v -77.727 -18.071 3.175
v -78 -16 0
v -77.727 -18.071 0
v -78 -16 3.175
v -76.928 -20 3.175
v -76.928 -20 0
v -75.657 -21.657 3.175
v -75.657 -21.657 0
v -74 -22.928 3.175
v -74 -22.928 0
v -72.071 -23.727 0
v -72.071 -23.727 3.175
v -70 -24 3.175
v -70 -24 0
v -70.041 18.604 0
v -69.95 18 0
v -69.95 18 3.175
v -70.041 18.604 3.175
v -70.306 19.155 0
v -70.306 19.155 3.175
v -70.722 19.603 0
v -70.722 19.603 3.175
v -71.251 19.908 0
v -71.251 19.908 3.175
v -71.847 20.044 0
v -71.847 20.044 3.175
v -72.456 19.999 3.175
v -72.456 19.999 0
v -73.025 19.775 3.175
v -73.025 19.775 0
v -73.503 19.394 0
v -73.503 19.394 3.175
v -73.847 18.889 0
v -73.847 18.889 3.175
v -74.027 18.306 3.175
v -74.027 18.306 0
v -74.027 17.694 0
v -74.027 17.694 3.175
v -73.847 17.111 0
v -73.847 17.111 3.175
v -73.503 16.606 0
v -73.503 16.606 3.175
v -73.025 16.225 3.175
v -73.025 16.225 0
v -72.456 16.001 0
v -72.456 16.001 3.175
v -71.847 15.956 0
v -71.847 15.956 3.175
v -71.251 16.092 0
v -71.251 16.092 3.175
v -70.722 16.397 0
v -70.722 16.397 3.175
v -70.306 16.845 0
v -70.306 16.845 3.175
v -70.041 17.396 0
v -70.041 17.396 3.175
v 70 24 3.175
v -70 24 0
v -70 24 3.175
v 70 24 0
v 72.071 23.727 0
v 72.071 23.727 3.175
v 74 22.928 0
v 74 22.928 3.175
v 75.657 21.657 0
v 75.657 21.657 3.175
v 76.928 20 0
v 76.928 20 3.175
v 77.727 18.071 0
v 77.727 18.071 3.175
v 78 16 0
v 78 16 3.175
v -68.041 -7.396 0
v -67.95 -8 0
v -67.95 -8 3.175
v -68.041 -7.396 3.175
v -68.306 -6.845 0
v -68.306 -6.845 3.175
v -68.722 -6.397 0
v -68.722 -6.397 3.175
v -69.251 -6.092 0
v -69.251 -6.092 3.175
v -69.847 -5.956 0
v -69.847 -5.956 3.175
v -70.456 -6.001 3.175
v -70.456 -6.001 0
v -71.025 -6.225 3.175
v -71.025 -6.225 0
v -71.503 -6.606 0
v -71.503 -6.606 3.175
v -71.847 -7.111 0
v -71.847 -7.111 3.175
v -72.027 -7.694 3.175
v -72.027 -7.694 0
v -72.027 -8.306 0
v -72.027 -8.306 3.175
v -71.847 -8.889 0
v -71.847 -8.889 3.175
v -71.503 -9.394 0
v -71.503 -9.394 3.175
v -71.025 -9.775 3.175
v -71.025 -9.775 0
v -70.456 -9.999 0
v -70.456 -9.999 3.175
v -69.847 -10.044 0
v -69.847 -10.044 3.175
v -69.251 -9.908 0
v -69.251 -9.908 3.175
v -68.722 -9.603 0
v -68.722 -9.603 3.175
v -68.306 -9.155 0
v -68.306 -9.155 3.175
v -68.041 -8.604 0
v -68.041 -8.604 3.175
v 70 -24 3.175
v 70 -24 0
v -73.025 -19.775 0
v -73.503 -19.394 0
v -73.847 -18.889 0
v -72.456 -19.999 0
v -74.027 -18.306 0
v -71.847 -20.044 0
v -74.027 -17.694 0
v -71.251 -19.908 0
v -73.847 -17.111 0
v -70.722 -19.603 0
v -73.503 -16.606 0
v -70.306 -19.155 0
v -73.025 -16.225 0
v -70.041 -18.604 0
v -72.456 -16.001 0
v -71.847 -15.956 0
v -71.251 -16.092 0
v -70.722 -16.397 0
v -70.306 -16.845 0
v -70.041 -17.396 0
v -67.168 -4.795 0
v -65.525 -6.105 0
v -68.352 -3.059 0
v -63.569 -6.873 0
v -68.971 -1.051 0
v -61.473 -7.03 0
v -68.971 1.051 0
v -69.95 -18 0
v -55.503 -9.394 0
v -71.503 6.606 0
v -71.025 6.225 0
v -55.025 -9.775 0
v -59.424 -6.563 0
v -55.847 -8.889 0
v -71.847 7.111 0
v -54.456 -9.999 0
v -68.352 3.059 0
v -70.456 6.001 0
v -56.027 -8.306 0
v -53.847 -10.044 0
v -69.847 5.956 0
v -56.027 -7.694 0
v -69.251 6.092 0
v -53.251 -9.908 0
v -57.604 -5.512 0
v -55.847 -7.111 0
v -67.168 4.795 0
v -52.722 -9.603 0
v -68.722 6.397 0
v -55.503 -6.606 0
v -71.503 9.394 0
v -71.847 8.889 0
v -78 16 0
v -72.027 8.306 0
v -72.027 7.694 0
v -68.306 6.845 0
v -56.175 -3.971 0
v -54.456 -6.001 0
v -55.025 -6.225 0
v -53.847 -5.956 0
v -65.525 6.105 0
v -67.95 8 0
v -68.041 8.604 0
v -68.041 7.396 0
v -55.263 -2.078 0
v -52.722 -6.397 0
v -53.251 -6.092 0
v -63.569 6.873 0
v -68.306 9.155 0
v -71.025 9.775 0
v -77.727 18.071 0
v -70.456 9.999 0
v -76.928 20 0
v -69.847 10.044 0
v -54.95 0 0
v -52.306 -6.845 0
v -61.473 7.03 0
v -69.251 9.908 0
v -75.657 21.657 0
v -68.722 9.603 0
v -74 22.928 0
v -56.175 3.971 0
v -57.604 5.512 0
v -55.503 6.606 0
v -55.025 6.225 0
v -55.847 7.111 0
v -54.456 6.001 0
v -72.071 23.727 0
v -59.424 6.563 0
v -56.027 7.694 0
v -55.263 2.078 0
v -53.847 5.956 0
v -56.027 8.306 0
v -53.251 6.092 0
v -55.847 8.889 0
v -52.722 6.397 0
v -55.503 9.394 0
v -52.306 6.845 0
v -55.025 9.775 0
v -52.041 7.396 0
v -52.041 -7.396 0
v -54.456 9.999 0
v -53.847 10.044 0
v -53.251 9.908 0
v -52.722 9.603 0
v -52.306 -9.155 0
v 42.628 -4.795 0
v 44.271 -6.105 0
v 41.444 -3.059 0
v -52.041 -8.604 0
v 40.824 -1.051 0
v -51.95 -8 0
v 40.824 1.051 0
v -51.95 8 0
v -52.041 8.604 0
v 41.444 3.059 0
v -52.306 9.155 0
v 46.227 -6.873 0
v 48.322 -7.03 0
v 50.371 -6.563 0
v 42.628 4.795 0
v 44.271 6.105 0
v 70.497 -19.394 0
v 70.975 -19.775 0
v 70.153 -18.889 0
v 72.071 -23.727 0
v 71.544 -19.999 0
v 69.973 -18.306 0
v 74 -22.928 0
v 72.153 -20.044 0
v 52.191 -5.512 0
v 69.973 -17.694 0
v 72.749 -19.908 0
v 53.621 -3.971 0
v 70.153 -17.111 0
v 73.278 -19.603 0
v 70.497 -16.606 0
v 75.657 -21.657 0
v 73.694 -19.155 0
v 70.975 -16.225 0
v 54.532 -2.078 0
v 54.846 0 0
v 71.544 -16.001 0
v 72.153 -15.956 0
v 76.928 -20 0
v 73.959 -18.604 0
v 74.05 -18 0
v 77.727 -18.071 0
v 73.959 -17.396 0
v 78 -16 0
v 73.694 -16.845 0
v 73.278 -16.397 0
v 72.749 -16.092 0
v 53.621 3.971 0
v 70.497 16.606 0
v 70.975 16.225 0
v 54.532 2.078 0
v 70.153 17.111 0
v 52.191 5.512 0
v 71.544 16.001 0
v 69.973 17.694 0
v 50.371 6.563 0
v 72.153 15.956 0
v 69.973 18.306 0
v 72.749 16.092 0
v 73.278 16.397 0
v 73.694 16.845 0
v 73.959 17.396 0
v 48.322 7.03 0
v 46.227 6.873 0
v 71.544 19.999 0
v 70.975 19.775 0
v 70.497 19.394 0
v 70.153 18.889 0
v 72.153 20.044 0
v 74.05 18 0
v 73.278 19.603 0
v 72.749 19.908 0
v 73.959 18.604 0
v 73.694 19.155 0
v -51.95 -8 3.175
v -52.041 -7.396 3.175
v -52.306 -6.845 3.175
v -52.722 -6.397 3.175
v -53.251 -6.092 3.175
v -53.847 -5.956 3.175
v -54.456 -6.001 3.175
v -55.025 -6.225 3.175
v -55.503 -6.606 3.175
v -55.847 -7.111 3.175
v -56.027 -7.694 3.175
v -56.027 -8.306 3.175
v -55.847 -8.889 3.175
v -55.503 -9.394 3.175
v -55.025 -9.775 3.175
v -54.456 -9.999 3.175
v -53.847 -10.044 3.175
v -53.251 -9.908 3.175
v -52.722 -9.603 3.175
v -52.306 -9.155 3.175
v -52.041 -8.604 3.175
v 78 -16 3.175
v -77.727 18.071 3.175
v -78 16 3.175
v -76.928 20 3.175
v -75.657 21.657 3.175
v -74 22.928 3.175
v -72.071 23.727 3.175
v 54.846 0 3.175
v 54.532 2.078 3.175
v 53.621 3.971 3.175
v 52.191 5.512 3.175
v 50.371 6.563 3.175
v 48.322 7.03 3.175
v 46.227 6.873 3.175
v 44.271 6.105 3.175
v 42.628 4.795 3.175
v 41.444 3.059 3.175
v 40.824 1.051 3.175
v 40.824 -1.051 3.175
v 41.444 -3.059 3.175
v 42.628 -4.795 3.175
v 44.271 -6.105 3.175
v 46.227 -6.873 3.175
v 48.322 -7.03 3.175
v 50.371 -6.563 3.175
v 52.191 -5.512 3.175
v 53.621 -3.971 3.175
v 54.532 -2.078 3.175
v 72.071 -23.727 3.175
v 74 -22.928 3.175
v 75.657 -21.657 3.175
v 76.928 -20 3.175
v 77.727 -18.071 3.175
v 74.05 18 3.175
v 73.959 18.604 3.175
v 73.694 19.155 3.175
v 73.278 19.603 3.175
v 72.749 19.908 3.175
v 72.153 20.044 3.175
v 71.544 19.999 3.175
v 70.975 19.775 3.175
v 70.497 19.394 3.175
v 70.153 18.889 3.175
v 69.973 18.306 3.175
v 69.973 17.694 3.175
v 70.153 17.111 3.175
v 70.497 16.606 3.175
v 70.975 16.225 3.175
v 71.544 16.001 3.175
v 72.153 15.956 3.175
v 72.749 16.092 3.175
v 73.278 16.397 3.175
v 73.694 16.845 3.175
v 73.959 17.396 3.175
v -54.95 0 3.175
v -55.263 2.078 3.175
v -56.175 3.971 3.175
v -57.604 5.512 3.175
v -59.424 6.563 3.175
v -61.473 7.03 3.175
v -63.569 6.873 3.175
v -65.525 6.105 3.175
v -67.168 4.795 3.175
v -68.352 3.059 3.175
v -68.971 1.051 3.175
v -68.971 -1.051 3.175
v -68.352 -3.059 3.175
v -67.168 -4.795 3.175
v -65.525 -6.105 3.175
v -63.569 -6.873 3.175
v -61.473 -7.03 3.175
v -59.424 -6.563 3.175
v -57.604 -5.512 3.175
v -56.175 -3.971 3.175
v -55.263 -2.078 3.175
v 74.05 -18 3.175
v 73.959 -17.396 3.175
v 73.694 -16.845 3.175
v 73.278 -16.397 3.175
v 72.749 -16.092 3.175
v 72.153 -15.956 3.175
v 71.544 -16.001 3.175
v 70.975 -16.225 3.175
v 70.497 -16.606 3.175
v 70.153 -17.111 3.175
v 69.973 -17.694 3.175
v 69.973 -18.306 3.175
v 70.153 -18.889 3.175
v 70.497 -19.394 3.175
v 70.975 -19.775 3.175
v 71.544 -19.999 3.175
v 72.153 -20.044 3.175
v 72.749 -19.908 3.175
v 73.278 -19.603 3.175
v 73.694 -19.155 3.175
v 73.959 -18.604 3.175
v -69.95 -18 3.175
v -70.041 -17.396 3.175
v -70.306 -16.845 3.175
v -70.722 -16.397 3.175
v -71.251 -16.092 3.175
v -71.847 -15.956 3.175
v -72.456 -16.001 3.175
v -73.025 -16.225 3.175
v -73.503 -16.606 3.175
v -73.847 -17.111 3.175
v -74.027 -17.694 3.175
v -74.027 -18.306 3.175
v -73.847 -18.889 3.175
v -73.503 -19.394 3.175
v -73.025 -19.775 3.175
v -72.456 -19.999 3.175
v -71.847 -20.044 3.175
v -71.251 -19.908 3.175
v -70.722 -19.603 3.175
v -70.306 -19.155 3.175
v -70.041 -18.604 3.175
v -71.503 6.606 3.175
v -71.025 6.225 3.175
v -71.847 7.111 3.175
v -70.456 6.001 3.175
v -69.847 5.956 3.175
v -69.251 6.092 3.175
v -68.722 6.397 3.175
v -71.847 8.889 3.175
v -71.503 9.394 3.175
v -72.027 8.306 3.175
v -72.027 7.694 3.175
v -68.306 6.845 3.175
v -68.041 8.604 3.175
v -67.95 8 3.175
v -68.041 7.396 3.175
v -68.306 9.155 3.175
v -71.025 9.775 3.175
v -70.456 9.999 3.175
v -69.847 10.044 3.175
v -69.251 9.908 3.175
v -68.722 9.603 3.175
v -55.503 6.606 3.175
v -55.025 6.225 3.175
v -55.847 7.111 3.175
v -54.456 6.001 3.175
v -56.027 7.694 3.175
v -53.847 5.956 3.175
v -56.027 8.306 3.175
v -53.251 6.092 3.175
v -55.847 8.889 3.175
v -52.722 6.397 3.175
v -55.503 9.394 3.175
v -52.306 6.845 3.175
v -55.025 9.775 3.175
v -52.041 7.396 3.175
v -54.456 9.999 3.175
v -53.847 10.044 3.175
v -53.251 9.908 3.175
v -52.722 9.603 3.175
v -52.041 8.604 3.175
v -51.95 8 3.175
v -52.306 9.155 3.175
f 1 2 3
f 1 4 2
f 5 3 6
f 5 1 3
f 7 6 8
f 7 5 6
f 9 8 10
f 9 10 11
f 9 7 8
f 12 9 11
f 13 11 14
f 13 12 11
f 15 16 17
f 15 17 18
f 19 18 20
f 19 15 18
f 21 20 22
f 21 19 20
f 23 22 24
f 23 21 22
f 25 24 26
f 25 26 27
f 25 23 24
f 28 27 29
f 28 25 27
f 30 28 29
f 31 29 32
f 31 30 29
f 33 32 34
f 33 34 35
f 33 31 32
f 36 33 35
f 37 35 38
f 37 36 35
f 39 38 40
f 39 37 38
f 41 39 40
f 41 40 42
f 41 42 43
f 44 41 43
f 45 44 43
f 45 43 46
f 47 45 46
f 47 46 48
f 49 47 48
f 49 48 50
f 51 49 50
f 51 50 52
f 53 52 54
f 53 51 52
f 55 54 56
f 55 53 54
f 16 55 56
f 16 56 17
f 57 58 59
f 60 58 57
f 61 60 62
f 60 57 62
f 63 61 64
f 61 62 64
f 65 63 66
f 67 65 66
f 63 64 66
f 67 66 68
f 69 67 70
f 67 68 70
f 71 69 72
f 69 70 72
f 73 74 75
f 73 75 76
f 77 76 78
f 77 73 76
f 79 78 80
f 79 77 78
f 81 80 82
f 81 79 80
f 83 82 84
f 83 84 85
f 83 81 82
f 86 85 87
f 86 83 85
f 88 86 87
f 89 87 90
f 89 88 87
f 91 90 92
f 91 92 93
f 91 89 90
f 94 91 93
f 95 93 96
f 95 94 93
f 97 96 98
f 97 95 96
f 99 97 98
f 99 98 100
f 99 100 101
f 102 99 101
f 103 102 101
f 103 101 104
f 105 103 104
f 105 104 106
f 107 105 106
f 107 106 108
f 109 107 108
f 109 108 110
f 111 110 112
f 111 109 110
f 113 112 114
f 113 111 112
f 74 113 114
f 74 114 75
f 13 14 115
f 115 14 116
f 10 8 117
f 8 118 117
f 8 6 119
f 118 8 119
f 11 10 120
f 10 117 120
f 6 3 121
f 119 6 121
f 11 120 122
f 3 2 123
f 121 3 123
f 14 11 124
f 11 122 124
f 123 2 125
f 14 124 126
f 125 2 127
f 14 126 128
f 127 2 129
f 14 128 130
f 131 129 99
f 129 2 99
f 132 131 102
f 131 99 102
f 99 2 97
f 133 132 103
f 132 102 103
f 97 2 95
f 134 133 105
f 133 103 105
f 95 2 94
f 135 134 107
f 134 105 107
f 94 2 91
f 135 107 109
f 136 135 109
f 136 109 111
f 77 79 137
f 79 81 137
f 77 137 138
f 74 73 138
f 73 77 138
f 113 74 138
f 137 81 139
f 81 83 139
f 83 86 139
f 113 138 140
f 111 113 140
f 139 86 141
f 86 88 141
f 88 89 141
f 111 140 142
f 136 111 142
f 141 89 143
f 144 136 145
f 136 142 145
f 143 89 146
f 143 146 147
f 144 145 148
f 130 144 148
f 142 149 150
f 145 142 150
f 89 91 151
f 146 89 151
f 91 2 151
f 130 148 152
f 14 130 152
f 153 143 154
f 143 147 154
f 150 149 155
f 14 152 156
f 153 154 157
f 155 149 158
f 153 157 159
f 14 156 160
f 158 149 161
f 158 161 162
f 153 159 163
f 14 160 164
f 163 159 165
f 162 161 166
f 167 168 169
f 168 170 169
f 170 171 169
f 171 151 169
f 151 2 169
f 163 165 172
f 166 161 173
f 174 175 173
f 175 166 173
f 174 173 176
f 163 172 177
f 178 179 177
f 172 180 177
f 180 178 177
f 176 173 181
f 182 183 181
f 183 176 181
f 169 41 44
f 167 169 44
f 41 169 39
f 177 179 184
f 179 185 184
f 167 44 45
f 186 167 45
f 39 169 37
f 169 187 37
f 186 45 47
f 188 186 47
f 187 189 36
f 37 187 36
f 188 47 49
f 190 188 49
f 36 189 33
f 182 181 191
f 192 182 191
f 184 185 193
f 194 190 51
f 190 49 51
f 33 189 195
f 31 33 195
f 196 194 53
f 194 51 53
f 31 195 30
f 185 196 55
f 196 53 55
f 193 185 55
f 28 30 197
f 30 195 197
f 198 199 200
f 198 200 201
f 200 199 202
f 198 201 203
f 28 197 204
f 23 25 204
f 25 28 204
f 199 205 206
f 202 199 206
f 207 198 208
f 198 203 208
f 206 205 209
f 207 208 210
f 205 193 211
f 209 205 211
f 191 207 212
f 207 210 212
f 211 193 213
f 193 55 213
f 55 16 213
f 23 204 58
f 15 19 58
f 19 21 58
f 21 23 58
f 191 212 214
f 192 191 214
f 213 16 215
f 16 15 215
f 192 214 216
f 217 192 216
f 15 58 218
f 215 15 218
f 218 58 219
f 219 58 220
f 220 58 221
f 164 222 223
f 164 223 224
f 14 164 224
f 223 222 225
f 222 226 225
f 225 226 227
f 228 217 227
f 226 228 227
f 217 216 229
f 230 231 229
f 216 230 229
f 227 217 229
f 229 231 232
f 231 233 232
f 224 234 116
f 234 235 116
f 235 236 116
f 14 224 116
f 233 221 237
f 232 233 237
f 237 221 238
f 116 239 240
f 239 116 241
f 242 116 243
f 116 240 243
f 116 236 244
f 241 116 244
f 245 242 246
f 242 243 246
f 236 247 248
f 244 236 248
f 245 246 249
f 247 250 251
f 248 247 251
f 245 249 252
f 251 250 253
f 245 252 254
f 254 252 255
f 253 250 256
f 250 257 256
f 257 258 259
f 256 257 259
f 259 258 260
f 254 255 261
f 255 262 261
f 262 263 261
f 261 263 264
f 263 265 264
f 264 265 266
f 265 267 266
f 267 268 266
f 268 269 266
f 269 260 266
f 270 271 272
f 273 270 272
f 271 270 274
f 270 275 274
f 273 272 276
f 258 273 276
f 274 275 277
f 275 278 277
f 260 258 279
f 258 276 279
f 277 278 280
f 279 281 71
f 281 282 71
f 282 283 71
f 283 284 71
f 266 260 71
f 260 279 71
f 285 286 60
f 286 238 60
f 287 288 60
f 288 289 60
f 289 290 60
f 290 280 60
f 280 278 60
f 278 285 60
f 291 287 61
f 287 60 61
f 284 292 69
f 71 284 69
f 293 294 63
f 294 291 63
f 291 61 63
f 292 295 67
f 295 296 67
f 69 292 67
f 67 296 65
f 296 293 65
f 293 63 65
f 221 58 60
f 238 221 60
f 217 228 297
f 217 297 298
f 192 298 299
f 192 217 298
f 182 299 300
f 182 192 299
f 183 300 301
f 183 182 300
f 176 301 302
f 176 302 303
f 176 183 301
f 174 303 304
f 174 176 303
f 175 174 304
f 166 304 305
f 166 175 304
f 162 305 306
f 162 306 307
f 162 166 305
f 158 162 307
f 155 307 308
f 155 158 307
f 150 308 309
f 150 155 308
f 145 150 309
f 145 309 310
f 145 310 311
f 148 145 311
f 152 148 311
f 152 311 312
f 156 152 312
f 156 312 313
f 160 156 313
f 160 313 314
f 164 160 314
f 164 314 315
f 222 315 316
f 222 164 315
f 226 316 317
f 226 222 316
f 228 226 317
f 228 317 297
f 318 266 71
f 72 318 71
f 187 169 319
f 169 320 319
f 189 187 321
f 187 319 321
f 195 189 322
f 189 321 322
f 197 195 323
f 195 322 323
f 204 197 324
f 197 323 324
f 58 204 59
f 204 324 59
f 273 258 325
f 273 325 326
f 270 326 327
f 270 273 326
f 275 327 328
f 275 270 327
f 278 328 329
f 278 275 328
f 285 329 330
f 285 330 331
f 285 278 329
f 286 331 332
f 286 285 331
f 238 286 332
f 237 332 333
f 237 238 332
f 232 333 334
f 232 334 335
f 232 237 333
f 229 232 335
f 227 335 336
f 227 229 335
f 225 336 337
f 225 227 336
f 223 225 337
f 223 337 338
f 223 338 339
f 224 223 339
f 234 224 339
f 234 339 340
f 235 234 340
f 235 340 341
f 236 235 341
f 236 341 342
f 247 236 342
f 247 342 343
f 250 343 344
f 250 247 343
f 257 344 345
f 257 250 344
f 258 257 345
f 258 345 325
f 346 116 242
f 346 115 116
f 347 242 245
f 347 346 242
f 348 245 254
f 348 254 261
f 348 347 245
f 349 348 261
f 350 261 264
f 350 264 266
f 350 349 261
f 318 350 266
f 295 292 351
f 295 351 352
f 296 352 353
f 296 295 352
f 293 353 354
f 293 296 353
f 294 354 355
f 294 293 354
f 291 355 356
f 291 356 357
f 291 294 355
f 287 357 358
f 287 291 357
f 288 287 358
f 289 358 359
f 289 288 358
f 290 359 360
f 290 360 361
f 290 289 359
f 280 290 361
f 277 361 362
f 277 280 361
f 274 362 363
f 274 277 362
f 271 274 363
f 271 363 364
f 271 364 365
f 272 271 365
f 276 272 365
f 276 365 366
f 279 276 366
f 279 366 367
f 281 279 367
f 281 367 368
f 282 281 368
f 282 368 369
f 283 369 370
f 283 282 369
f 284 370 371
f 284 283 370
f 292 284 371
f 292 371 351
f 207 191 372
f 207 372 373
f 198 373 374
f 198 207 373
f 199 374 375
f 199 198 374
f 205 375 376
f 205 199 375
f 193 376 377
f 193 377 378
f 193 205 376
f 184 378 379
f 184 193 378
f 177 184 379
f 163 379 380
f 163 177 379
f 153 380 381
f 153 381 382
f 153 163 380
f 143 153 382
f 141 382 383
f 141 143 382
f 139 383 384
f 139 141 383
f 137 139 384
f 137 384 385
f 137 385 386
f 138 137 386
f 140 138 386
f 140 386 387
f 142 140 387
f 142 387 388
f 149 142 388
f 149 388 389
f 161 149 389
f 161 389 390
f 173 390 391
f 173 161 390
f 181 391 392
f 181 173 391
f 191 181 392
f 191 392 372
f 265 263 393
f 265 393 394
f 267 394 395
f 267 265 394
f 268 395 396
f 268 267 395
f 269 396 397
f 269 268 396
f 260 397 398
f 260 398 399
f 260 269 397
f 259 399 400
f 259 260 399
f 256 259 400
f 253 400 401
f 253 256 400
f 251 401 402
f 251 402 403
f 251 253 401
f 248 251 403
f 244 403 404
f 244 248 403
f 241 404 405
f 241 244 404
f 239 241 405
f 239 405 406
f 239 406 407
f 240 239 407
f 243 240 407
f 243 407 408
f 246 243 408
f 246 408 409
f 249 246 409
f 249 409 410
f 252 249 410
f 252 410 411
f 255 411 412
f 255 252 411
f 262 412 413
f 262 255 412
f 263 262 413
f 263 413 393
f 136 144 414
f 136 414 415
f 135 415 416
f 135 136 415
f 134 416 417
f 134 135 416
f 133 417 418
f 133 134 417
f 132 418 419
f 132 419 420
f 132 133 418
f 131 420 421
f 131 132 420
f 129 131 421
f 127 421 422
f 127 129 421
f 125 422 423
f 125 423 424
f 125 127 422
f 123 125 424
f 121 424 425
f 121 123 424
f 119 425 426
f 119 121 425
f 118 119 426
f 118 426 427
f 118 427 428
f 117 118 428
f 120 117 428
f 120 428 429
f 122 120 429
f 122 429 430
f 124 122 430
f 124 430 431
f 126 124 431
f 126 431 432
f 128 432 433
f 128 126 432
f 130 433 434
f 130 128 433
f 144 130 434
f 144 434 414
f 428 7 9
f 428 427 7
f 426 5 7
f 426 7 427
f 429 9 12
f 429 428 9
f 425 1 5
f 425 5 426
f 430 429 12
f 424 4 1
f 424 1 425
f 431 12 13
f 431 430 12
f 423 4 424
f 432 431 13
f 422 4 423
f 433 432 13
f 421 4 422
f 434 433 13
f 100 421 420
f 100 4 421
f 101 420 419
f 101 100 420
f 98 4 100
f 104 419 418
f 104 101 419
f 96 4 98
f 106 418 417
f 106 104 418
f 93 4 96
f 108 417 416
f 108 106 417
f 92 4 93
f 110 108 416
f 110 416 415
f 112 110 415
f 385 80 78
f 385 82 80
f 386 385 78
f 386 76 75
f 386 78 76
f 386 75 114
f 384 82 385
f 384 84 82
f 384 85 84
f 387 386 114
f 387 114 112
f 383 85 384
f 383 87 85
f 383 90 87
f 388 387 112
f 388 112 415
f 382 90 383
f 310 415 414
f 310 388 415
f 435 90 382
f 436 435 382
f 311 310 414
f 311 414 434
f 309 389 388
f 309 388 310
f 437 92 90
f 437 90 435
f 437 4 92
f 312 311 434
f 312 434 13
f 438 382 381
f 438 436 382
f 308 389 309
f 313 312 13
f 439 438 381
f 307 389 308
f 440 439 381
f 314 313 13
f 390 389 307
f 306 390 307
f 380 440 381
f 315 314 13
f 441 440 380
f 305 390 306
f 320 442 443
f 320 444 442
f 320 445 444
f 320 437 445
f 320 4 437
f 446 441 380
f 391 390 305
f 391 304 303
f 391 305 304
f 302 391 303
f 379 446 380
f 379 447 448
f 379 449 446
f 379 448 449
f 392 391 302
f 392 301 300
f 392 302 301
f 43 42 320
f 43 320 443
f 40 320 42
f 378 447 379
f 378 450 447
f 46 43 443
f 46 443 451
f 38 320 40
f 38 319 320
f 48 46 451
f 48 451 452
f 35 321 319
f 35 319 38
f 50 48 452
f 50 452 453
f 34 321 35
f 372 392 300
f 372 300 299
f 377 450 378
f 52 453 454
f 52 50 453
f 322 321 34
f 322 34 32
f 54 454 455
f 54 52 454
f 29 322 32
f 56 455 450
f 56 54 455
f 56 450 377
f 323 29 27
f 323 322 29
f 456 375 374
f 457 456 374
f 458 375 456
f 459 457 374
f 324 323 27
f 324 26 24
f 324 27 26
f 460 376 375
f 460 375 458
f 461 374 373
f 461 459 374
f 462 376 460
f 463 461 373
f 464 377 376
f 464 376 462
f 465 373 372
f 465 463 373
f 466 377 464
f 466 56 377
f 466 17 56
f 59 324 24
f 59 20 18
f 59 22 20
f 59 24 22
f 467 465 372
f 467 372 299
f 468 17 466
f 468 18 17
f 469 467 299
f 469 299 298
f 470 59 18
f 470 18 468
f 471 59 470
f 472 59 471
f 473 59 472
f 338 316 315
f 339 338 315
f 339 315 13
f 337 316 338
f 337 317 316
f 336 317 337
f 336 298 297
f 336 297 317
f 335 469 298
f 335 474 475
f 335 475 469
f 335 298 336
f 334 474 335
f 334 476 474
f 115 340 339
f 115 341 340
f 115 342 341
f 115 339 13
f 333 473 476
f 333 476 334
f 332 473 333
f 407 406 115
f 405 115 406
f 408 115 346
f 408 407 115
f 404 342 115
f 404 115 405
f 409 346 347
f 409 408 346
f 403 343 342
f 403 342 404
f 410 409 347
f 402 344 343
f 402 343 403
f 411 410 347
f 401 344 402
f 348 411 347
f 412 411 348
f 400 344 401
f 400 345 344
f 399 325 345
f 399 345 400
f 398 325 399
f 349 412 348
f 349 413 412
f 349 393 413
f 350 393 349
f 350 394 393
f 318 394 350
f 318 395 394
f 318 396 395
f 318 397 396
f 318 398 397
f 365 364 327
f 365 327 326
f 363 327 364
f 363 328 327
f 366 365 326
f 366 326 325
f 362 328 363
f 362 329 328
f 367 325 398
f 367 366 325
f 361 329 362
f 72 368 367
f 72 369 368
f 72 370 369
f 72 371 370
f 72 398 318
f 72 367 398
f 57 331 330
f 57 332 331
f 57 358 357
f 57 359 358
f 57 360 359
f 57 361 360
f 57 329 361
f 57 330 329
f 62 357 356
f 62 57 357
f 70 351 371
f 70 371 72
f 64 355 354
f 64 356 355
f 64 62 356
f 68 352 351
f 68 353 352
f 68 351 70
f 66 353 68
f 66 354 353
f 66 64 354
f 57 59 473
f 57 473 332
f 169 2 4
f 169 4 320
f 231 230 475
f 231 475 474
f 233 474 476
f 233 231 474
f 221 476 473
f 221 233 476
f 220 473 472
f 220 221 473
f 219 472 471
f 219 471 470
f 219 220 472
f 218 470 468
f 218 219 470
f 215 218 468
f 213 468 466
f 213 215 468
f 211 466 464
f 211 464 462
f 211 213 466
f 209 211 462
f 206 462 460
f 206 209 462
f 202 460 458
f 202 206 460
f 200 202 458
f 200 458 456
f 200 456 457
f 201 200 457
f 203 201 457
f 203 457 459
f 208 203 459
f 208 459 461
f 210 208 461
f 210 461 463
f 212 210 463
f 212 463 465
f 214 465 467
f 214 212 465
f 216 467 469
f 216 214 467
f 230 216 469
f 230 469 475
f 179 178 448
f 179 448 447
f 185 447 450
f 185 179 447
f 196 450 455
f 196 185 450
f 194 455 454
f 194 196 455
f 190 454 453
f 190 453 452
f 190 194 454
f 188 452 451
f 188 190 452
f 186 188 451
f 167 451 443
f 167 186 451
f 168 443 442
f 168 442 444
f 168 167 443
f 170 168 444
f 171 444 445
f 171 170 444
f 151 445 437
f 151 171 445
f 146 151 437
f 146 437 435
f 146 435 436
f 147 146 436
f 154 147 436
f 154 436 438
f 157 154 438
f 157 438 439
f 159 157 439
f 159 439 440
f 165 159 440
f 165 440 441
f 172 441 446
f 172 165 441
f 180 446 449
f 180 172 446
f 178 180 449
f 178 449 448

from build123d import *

# Parameters (mm, degrees)
SKETCH2_W           = 156
SKETCH2_H           = 48
SKETCH2_R           = 2.05
SKETCH2_R_2         = 7.05
BOSS_EXTRUDE2_DEPTH = 3.175
FILLET1_R           = 8


with BuildPart() as part:
    # Sketch2 → Boss-Extrude2 (new body)
    with BuildSketch(Plane.XY):
        Rectangle(SKETCH2_W, SKETCH2_H)
        with Locations((-70, 8)):
            Circle(SKETCH2_R, mode=Mode.SUBTRACT)
        with Locations((-54, 8)):
            Circle(SKETCH2_R, mode=Mode.SUBTRACT)
        with Locations((-54, -8)):
            Circle(SKETCH2_R, mode=Mode.SUBTRACT)
        with Locations((-70, -8)):
            Circle(SKETCH2_R, mode=Mode.SUBTRACT)
        with Locations((47.795580317, 0)):
            Circle(SKETCH2_R_2, mode=Mode.SUBTRACT)
        with Locations((-62, 0)):
            Circle(SKETCH2_R_2, mode=Mode.SUBTRACT)
        with Locations((72, 18)):
            Circle(SKETCH2_R, mode=Mode.SUBTRACT)
        with Locations((72, -18)):
            Circle(SKETCH2_R, mode=Mode.SUBTRACT)
        with Locations((-72, -18)):
            Circle(SKETCH2_R, mode=Mode.SUBTRACT)
        with Locations((-72, 18)):
            Circle(SKETCH2_R, mode=Mode.SUBTRACT)
    extrude(amount=BOSS_EXTRUDE2_DEPTH)

    # Fillet1
    fillet1_edges = [part.edges().sort_by_distance(p)[0] for p in [
        (78, 24, 1.5875),
        (78, -24, 1.5875),
        (-78, -24, 1.5875),
        (-78, 24, 1.5875),
    ]]
    fillet(fillet1_edges, radius=FILLET1_R)


solid = part.part
